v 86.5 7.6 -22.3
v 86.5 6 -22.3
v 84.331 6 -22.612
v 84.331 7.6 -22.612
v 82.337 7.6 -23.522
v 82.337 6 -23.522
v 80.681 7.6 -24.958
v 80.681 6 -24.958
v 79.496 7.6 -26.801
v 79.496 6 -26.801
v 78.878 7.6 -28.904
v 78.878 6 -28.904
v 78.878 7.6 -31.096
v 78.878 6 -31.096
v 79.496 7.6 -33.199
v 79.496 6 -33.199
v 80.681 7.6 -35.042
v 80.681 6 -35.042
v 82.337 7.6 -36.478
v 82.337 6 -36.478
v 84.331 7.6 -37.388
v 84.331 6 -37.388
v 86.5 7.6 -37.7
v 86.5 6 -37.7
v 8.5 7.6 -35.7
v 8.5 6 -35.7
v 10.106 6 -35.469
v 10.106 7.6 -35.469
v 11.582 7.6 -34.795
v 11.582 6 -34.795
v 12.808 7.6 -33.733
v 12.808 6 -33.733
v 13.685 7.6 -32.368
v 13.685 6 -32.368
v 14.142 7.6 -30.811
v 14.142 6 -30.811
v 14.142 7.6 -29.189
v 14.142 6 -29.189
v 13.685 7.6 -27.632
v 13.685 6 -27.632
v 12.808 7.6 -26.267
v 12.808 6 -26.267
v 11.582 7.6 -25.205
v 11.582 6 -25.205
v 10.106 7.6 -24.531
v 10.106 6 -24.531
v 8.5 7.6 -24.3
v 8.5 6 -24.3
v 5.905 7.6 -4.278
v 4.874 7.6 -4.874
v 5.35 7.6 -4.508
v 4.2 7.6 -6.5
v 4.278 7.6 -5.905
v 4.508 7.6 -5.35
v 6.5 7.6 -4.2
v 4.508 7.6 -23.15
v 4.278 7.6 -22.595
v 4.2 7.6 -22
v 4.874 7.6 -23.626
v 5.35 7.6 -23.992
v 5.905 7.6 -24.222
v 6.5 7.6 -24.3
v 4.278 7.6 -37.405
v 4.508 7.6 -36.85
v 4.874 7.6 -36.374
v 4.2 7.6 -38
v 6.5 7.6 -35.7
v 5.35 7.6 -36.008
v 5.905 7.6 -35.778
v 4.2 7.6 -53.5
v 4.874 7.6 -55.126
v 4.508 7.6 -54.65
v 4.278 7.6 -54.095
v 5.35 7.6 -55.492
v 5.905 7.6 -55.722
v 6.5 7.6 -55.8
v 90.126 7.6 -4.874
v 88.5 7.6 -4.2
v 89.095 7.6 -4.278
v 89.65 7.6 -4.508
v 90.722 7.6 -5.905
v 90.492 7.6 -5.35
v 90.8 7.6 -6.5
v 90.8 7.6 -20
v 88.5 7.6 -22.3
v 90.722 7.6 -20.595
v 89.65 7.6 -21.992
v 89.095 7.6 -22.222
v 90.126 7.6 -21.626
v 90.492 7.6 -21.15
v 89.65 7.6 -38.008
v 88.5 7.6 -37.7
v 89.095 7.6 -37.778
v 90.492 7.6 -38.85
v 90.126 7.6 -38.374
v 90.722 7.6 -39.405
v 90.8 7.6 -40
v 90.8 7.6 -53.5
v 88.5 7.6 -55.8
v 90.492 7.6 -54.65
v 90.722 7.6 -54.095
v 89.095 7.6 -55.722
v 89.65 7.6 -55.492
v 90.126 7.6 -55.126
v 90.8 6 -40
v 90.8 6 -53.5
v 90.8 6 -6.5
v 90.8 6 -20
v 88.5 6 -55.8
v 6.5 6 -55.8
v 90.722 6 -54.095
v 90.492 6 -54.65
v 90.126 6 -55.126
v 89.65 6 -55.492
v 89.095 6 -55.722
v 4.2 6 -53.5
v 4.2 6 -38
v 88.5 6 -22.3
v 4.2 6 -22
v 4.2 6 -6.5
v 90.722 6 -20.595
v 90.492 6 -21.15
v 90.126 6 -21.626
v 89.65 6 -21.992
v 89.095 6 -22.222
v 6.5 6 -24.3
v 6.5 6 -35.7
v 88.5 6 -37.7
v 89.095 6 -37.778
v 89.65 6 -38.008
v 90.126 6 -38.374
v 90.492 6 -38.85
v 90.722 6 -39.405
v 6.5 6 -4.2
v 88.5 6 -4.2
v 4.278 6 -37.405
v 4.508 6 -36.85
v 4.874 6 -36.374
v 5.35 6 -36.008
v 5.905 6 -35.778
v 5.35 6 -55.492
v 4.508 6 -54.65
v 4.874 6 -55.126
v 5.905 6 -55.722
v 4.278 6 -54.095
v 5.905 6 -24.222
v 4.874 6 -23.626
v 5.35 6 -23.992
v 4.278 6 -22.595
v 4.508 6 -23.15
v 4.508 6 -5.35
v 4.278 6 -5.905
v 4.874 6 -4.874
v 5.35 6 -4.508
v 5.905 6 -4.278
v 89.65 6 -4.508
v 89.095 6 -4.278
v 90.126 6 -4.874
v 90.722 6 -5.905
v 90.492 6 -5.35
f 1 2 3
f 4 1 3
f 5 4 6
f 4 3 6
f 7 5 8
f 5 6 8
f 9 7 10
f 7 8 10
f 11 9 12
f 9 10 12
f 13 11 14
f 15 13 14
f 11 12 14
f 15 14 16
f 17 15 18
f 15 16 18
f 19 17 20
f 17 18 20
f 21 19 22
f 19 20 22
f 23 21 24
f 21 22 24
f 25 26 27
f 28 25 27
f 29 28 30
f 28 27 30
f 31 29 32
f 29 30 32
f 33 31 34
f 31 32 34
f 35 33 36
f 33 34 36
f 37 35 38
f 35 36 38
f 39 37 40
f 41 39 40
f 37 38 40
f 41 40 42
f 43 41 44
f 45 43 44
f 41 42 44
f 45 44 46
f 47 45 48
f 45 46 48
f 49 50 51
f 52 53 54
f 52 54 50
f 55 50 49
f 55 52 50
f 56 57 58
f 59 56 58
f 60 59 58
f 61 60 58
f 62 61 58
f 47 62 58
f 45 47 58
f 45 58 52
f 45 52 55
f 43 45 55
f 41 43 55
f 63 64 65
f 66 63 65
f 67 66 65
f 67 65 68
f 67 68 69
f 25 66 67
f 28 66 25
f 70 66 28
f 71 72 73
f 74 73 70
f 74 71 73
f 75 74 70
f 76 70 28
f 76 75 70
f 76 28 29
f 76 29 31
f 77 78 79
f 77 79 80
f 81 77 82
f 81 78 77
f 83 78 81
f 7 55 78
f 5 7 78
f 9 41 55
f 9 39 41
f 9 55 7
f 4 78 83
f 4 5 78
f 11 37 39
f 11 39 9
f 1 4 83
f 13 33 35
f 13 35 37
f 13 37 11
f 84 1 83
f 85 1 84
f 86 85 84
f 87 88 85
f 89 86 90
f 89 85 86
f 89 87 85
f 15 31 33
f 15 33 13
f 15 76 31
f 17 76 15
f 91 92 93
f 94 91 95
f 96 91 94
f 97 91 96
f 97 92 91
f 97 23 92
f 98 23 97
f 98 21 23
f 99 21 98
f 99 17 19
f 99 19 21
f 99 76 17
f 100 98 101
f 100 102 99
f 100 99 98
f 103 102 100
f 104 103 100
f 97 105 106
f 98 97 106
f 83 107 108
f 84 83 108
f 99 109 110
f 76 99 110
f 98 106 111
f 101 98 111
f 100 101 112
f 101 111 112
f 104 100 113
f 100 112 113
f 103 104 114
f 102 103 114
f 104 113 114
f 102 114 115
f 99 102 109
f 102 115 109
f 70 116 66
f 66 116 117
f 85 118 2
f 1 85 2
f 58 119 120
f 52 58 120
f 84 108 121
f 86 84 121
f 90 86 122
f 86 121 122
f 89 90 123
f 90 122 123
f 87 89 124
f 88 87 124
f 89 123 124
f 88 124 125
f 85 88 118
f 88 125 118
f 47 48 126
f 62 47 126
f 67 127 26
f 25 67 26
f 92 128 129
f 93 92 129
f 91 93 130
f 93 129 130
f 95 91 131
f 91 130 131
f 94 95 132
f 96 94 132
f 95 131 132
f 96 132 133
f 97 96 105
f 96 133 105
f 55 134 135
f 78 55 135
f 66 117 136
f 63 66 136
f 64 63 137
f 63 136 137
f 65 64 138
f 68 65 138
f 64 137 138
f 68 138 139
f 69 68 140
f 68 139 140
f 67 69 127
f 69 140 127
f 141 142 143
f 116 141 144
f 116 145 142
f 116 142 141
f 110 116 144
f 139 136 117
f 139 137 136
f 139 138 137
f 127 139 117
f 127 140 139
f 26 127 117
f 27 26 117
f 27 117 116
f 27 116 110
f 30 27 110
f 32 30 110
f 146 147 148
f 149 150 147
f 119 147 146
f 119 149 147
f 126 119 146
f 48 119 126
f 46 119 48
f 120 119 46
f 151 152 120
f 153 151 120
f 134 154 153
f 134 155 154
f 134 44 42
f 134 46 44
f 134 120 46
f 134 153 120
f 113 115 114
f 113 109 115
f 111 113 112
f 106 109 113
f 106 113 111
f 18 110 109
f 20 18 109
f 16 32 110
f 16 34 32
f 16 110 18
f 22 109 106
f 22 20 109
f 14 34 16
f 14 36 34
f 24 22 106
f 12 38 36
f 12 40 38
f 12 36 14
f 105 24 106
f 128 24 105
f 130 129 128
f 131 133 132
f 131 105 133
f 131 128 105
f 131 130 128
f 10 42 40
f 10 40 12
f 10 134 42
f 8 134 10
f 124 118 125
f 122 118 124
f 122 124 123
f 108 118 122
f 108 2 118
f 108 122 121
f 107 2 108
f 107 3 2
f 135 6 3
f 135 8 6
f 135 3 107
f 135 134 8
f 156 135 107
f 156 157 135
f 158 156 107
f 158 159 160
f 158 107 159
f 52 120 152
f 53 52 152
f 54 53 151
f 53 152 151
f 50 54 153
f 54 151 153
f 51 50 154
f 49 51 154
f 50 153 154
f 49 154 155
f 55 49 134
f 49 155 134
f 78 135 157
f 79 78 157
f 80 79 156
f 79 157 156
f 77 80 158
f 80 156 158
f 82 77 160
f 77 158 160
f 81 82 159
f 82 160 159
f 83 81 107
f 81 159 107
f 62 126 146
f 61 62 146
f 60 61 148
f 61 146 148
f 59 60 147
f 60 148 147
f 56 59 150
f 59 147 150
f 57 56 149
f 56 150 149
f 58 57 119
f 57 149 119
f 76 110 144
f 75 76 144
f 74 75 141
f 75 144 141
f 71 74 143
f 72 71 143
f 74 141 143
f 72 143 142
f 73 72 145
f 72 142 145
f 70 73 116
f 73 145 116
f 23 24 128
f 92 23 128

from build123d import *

# Parameters (mm, degrees)
SKETCH1_W           = 95
SKETCH1_H           = 60
BOSS_EXTRUDE1_DEPTH = 6
SKETCH6_R           = 3.5
SKETCH6_R_2         = 1.5
CUT_EXTRUDE3_DEPTH  = 113.521109131
CUT_EXTRUDE1_DEPTH  = 113.521109131
FILLET3_R           = 1.5
SKETCH7_W           = 8.5
SKETCH7_H           = 3
SKETCH7_H_2         = 7
CUT_EXTRUDE4_DEPTH  = 113.521109131
FILLET4_R           = 5
FILLET5_R           = 1.5
BOSS_EXTRUDE2_DEPTH = 1.6
SKETCH10_W          = 102.175429208
SKETCH10_H          = 24.243237214
CUT_EXTRUDE6_DEPTH  = 113.617760589


with BuildPart() as part:
    # Sketch1 → Boss-Extrude1 (new body)
    with BuildSketch(Plane(origin=(0, 0, 0), x_dir=(1, 0, 0), z_dir=(0, 1, 0))):
        with Locations((47.5, 30)):
            Rectangle(SKETCH1_W, SKETCH1_H)
    extrude(amount=BOSS_EXTRUDE1_DEPTH)

    # Sketch6 → Cut-Extrude3 (cut, through all)
    with BuildSketch(Plane.XZ):
        with Locations((86.5, -30)):
            Circle(SKETCH6_R)
        with Locations((8.5, -30)):
            Circle(SKETCH6_R_2)
    extrude(amount=-CUT_EXTRUDE3_DEPTH, mode=Mode.SUBTRACT)

    # Sketch2 → Cut-Extrude1 (cut, through all)
    with BuildSketch(Plane(origin=(0, 6, 0), x_dir=(-1, 0, 0), z_dir=(0, 1, 0))):
        with BuildLine():
            Line((-8.5, -36.5), (-5, -36.5))
            Line((-5, -36.5), (-5, -55))
            Line((-5, -55), (-90, -55))
            Line((-90, -55), (-90, -38.5))
            Line((-90, -38.5), (-86.5, -38.5))
            ThreePointArc((-86.5, -38.5), (-78, -30), (-86.5, -21.5))
            Line((-86.5, -21.5), (-90, -21.5))
            Line((-90, -21.5), (-90, -5))
            Line((-90, -5), (-5, -5))
            Line((-5, -5), (-5, -23.5))
            Line((-5, -23.5), (-8.5, -23.5))
            ThreePointArc((-8.5, -23.5), (-15, -30), (-8.5, -36.5))
        make_face()
    extrude(amount=-CUT_EXTRUDE1_DEPTH, mode=Mode.SUBTRACT)

    # Fillet3
    fillet3_edges = [part.edges().sort_by_distance(p)[0] for p in [
        (90, 3, -55),
    ]]
    fillet(fillet3_edges, radius=FILLET3_R)

    # Sketch7 → Cut-Extrude4 (cut, through all)
    with BuildSketch(Plane(origin=(0, 6, 0), x_dir=(-1, 0, 0), z_dir=(0, 1, 0))):
        with Locations((-4.25, -30)):
            Rectangle(SKETCH7_W, SKETCH7_H)
        with Locations((-90.75, -30)):
            Rectangle(SKETCH7_W, SKETCH7_H_2)
    extrude(amount=-CUT_EXTRUDE4_DEPTH, mode=Mode.SUBTRACT)

    # Fillet4
    fillet4_edges = [part.edges().sort_by_distance(p)[0] for p in [
        (95, 3, -33.5),
        (0, 3, 0),
        (0, 3, -28.5),
        (0, 3, -31.5),
        (0, 3, -60),
        (95, 3, -60),
        (95, 3, -26.5),
        (95, 3, 0),
    ]]
    fillet(fillet4_edges, radius=FILLET4_R)

    # Fillet5
    fillet5_edges = [part.edges().sort_by_distance(p)[0] for p in [
        (90, 3, -38.5),
        (90, 3, -5),
        (90, 3, -21.5),
        (5, 3, -5),
        (5, 3, -36.5),
        (5, 3, -23.5),
        (5, 3, -55),
    ]]
    fillet(fillet5_edges, radius=FILLET5_R)

    # Sketch9 → Boss-Extrude2 (add)
    with BuildSketch(Plane(origin=(0, 6, 0), x_dir=(1, 0, 0), z_dir=(0, 1, 0))):
        with BuildLine():
            Line((6.5, 4.2), (88.5, 4.2))
            ThreePointArc((88.5, 4.2), (90.126345597, 4.873654403), (90.8, 6.5))
            Line((90.8, 6.5), (90.8, 20))
            ThreePointArc((90.8, 20), (90.126345597, 21.626345597), (88.5, 22.3))
            Line((88.5, 22.3), (86.5, 22.3))
            ThreePointArc((86.5, 22.3), (78.8, 30), (86.5, 37.7))
            Line((86.5, 37.7), (88.5, 37.7))
            ThreePointArc((88.5, 37.7), (90.126345597, 38.373654403), (90.8, 40))
            Line((90.8, 40), (90.8, 53.5))
            ThreePointArc((90.8, 53.5), (90.126345597, 55.126345597), (88.5, 55.8))
            Line((88.5, 55.8), (6.5, 55.8))
            ThreePointArc((6.5, 55.8), (4.873654403, 55.126345597), (4.2, 53.5))
            Line((4.2, 53.5), (4.2, 38))
            ThreePointArc((4.2, 38), (4.873654403, 36.373654403), (6.5, 35.7))
            Line((6.5, 35.7), (8.5, 35.7))
            ThreePointArc((8.5, 35.7), (14.2, 30), (8.5, 24.3))
            Line((8.5, 24.3), (6.5, 24.3))
            ThreePointArc((6.5, 24.3), (4.873654403, 23.626345597), (4.2, 22))
            Line((4.2, 22), (4.2, 6.5))
            ThreePointArc((4.2, 6.5), (4.873654403, 4.873654403), (6.5, 4.2))
        make_face()
    extrude(amount=BOSS_EXTRUDE2_DEPTH)

    # Sketch10 → Cut-Extrude6 (cut, through all)
    with BuildSketch(Plane.XY):
        with Locations((51.087714604, -6.121618607)):
            Rectangle(SKETCH10_W, SKETCH10_H)
    extrude(amount=-CUT_EXTRUDE6_DEPTH, mode=Mode.SUBTRACT)


solid = part.part
